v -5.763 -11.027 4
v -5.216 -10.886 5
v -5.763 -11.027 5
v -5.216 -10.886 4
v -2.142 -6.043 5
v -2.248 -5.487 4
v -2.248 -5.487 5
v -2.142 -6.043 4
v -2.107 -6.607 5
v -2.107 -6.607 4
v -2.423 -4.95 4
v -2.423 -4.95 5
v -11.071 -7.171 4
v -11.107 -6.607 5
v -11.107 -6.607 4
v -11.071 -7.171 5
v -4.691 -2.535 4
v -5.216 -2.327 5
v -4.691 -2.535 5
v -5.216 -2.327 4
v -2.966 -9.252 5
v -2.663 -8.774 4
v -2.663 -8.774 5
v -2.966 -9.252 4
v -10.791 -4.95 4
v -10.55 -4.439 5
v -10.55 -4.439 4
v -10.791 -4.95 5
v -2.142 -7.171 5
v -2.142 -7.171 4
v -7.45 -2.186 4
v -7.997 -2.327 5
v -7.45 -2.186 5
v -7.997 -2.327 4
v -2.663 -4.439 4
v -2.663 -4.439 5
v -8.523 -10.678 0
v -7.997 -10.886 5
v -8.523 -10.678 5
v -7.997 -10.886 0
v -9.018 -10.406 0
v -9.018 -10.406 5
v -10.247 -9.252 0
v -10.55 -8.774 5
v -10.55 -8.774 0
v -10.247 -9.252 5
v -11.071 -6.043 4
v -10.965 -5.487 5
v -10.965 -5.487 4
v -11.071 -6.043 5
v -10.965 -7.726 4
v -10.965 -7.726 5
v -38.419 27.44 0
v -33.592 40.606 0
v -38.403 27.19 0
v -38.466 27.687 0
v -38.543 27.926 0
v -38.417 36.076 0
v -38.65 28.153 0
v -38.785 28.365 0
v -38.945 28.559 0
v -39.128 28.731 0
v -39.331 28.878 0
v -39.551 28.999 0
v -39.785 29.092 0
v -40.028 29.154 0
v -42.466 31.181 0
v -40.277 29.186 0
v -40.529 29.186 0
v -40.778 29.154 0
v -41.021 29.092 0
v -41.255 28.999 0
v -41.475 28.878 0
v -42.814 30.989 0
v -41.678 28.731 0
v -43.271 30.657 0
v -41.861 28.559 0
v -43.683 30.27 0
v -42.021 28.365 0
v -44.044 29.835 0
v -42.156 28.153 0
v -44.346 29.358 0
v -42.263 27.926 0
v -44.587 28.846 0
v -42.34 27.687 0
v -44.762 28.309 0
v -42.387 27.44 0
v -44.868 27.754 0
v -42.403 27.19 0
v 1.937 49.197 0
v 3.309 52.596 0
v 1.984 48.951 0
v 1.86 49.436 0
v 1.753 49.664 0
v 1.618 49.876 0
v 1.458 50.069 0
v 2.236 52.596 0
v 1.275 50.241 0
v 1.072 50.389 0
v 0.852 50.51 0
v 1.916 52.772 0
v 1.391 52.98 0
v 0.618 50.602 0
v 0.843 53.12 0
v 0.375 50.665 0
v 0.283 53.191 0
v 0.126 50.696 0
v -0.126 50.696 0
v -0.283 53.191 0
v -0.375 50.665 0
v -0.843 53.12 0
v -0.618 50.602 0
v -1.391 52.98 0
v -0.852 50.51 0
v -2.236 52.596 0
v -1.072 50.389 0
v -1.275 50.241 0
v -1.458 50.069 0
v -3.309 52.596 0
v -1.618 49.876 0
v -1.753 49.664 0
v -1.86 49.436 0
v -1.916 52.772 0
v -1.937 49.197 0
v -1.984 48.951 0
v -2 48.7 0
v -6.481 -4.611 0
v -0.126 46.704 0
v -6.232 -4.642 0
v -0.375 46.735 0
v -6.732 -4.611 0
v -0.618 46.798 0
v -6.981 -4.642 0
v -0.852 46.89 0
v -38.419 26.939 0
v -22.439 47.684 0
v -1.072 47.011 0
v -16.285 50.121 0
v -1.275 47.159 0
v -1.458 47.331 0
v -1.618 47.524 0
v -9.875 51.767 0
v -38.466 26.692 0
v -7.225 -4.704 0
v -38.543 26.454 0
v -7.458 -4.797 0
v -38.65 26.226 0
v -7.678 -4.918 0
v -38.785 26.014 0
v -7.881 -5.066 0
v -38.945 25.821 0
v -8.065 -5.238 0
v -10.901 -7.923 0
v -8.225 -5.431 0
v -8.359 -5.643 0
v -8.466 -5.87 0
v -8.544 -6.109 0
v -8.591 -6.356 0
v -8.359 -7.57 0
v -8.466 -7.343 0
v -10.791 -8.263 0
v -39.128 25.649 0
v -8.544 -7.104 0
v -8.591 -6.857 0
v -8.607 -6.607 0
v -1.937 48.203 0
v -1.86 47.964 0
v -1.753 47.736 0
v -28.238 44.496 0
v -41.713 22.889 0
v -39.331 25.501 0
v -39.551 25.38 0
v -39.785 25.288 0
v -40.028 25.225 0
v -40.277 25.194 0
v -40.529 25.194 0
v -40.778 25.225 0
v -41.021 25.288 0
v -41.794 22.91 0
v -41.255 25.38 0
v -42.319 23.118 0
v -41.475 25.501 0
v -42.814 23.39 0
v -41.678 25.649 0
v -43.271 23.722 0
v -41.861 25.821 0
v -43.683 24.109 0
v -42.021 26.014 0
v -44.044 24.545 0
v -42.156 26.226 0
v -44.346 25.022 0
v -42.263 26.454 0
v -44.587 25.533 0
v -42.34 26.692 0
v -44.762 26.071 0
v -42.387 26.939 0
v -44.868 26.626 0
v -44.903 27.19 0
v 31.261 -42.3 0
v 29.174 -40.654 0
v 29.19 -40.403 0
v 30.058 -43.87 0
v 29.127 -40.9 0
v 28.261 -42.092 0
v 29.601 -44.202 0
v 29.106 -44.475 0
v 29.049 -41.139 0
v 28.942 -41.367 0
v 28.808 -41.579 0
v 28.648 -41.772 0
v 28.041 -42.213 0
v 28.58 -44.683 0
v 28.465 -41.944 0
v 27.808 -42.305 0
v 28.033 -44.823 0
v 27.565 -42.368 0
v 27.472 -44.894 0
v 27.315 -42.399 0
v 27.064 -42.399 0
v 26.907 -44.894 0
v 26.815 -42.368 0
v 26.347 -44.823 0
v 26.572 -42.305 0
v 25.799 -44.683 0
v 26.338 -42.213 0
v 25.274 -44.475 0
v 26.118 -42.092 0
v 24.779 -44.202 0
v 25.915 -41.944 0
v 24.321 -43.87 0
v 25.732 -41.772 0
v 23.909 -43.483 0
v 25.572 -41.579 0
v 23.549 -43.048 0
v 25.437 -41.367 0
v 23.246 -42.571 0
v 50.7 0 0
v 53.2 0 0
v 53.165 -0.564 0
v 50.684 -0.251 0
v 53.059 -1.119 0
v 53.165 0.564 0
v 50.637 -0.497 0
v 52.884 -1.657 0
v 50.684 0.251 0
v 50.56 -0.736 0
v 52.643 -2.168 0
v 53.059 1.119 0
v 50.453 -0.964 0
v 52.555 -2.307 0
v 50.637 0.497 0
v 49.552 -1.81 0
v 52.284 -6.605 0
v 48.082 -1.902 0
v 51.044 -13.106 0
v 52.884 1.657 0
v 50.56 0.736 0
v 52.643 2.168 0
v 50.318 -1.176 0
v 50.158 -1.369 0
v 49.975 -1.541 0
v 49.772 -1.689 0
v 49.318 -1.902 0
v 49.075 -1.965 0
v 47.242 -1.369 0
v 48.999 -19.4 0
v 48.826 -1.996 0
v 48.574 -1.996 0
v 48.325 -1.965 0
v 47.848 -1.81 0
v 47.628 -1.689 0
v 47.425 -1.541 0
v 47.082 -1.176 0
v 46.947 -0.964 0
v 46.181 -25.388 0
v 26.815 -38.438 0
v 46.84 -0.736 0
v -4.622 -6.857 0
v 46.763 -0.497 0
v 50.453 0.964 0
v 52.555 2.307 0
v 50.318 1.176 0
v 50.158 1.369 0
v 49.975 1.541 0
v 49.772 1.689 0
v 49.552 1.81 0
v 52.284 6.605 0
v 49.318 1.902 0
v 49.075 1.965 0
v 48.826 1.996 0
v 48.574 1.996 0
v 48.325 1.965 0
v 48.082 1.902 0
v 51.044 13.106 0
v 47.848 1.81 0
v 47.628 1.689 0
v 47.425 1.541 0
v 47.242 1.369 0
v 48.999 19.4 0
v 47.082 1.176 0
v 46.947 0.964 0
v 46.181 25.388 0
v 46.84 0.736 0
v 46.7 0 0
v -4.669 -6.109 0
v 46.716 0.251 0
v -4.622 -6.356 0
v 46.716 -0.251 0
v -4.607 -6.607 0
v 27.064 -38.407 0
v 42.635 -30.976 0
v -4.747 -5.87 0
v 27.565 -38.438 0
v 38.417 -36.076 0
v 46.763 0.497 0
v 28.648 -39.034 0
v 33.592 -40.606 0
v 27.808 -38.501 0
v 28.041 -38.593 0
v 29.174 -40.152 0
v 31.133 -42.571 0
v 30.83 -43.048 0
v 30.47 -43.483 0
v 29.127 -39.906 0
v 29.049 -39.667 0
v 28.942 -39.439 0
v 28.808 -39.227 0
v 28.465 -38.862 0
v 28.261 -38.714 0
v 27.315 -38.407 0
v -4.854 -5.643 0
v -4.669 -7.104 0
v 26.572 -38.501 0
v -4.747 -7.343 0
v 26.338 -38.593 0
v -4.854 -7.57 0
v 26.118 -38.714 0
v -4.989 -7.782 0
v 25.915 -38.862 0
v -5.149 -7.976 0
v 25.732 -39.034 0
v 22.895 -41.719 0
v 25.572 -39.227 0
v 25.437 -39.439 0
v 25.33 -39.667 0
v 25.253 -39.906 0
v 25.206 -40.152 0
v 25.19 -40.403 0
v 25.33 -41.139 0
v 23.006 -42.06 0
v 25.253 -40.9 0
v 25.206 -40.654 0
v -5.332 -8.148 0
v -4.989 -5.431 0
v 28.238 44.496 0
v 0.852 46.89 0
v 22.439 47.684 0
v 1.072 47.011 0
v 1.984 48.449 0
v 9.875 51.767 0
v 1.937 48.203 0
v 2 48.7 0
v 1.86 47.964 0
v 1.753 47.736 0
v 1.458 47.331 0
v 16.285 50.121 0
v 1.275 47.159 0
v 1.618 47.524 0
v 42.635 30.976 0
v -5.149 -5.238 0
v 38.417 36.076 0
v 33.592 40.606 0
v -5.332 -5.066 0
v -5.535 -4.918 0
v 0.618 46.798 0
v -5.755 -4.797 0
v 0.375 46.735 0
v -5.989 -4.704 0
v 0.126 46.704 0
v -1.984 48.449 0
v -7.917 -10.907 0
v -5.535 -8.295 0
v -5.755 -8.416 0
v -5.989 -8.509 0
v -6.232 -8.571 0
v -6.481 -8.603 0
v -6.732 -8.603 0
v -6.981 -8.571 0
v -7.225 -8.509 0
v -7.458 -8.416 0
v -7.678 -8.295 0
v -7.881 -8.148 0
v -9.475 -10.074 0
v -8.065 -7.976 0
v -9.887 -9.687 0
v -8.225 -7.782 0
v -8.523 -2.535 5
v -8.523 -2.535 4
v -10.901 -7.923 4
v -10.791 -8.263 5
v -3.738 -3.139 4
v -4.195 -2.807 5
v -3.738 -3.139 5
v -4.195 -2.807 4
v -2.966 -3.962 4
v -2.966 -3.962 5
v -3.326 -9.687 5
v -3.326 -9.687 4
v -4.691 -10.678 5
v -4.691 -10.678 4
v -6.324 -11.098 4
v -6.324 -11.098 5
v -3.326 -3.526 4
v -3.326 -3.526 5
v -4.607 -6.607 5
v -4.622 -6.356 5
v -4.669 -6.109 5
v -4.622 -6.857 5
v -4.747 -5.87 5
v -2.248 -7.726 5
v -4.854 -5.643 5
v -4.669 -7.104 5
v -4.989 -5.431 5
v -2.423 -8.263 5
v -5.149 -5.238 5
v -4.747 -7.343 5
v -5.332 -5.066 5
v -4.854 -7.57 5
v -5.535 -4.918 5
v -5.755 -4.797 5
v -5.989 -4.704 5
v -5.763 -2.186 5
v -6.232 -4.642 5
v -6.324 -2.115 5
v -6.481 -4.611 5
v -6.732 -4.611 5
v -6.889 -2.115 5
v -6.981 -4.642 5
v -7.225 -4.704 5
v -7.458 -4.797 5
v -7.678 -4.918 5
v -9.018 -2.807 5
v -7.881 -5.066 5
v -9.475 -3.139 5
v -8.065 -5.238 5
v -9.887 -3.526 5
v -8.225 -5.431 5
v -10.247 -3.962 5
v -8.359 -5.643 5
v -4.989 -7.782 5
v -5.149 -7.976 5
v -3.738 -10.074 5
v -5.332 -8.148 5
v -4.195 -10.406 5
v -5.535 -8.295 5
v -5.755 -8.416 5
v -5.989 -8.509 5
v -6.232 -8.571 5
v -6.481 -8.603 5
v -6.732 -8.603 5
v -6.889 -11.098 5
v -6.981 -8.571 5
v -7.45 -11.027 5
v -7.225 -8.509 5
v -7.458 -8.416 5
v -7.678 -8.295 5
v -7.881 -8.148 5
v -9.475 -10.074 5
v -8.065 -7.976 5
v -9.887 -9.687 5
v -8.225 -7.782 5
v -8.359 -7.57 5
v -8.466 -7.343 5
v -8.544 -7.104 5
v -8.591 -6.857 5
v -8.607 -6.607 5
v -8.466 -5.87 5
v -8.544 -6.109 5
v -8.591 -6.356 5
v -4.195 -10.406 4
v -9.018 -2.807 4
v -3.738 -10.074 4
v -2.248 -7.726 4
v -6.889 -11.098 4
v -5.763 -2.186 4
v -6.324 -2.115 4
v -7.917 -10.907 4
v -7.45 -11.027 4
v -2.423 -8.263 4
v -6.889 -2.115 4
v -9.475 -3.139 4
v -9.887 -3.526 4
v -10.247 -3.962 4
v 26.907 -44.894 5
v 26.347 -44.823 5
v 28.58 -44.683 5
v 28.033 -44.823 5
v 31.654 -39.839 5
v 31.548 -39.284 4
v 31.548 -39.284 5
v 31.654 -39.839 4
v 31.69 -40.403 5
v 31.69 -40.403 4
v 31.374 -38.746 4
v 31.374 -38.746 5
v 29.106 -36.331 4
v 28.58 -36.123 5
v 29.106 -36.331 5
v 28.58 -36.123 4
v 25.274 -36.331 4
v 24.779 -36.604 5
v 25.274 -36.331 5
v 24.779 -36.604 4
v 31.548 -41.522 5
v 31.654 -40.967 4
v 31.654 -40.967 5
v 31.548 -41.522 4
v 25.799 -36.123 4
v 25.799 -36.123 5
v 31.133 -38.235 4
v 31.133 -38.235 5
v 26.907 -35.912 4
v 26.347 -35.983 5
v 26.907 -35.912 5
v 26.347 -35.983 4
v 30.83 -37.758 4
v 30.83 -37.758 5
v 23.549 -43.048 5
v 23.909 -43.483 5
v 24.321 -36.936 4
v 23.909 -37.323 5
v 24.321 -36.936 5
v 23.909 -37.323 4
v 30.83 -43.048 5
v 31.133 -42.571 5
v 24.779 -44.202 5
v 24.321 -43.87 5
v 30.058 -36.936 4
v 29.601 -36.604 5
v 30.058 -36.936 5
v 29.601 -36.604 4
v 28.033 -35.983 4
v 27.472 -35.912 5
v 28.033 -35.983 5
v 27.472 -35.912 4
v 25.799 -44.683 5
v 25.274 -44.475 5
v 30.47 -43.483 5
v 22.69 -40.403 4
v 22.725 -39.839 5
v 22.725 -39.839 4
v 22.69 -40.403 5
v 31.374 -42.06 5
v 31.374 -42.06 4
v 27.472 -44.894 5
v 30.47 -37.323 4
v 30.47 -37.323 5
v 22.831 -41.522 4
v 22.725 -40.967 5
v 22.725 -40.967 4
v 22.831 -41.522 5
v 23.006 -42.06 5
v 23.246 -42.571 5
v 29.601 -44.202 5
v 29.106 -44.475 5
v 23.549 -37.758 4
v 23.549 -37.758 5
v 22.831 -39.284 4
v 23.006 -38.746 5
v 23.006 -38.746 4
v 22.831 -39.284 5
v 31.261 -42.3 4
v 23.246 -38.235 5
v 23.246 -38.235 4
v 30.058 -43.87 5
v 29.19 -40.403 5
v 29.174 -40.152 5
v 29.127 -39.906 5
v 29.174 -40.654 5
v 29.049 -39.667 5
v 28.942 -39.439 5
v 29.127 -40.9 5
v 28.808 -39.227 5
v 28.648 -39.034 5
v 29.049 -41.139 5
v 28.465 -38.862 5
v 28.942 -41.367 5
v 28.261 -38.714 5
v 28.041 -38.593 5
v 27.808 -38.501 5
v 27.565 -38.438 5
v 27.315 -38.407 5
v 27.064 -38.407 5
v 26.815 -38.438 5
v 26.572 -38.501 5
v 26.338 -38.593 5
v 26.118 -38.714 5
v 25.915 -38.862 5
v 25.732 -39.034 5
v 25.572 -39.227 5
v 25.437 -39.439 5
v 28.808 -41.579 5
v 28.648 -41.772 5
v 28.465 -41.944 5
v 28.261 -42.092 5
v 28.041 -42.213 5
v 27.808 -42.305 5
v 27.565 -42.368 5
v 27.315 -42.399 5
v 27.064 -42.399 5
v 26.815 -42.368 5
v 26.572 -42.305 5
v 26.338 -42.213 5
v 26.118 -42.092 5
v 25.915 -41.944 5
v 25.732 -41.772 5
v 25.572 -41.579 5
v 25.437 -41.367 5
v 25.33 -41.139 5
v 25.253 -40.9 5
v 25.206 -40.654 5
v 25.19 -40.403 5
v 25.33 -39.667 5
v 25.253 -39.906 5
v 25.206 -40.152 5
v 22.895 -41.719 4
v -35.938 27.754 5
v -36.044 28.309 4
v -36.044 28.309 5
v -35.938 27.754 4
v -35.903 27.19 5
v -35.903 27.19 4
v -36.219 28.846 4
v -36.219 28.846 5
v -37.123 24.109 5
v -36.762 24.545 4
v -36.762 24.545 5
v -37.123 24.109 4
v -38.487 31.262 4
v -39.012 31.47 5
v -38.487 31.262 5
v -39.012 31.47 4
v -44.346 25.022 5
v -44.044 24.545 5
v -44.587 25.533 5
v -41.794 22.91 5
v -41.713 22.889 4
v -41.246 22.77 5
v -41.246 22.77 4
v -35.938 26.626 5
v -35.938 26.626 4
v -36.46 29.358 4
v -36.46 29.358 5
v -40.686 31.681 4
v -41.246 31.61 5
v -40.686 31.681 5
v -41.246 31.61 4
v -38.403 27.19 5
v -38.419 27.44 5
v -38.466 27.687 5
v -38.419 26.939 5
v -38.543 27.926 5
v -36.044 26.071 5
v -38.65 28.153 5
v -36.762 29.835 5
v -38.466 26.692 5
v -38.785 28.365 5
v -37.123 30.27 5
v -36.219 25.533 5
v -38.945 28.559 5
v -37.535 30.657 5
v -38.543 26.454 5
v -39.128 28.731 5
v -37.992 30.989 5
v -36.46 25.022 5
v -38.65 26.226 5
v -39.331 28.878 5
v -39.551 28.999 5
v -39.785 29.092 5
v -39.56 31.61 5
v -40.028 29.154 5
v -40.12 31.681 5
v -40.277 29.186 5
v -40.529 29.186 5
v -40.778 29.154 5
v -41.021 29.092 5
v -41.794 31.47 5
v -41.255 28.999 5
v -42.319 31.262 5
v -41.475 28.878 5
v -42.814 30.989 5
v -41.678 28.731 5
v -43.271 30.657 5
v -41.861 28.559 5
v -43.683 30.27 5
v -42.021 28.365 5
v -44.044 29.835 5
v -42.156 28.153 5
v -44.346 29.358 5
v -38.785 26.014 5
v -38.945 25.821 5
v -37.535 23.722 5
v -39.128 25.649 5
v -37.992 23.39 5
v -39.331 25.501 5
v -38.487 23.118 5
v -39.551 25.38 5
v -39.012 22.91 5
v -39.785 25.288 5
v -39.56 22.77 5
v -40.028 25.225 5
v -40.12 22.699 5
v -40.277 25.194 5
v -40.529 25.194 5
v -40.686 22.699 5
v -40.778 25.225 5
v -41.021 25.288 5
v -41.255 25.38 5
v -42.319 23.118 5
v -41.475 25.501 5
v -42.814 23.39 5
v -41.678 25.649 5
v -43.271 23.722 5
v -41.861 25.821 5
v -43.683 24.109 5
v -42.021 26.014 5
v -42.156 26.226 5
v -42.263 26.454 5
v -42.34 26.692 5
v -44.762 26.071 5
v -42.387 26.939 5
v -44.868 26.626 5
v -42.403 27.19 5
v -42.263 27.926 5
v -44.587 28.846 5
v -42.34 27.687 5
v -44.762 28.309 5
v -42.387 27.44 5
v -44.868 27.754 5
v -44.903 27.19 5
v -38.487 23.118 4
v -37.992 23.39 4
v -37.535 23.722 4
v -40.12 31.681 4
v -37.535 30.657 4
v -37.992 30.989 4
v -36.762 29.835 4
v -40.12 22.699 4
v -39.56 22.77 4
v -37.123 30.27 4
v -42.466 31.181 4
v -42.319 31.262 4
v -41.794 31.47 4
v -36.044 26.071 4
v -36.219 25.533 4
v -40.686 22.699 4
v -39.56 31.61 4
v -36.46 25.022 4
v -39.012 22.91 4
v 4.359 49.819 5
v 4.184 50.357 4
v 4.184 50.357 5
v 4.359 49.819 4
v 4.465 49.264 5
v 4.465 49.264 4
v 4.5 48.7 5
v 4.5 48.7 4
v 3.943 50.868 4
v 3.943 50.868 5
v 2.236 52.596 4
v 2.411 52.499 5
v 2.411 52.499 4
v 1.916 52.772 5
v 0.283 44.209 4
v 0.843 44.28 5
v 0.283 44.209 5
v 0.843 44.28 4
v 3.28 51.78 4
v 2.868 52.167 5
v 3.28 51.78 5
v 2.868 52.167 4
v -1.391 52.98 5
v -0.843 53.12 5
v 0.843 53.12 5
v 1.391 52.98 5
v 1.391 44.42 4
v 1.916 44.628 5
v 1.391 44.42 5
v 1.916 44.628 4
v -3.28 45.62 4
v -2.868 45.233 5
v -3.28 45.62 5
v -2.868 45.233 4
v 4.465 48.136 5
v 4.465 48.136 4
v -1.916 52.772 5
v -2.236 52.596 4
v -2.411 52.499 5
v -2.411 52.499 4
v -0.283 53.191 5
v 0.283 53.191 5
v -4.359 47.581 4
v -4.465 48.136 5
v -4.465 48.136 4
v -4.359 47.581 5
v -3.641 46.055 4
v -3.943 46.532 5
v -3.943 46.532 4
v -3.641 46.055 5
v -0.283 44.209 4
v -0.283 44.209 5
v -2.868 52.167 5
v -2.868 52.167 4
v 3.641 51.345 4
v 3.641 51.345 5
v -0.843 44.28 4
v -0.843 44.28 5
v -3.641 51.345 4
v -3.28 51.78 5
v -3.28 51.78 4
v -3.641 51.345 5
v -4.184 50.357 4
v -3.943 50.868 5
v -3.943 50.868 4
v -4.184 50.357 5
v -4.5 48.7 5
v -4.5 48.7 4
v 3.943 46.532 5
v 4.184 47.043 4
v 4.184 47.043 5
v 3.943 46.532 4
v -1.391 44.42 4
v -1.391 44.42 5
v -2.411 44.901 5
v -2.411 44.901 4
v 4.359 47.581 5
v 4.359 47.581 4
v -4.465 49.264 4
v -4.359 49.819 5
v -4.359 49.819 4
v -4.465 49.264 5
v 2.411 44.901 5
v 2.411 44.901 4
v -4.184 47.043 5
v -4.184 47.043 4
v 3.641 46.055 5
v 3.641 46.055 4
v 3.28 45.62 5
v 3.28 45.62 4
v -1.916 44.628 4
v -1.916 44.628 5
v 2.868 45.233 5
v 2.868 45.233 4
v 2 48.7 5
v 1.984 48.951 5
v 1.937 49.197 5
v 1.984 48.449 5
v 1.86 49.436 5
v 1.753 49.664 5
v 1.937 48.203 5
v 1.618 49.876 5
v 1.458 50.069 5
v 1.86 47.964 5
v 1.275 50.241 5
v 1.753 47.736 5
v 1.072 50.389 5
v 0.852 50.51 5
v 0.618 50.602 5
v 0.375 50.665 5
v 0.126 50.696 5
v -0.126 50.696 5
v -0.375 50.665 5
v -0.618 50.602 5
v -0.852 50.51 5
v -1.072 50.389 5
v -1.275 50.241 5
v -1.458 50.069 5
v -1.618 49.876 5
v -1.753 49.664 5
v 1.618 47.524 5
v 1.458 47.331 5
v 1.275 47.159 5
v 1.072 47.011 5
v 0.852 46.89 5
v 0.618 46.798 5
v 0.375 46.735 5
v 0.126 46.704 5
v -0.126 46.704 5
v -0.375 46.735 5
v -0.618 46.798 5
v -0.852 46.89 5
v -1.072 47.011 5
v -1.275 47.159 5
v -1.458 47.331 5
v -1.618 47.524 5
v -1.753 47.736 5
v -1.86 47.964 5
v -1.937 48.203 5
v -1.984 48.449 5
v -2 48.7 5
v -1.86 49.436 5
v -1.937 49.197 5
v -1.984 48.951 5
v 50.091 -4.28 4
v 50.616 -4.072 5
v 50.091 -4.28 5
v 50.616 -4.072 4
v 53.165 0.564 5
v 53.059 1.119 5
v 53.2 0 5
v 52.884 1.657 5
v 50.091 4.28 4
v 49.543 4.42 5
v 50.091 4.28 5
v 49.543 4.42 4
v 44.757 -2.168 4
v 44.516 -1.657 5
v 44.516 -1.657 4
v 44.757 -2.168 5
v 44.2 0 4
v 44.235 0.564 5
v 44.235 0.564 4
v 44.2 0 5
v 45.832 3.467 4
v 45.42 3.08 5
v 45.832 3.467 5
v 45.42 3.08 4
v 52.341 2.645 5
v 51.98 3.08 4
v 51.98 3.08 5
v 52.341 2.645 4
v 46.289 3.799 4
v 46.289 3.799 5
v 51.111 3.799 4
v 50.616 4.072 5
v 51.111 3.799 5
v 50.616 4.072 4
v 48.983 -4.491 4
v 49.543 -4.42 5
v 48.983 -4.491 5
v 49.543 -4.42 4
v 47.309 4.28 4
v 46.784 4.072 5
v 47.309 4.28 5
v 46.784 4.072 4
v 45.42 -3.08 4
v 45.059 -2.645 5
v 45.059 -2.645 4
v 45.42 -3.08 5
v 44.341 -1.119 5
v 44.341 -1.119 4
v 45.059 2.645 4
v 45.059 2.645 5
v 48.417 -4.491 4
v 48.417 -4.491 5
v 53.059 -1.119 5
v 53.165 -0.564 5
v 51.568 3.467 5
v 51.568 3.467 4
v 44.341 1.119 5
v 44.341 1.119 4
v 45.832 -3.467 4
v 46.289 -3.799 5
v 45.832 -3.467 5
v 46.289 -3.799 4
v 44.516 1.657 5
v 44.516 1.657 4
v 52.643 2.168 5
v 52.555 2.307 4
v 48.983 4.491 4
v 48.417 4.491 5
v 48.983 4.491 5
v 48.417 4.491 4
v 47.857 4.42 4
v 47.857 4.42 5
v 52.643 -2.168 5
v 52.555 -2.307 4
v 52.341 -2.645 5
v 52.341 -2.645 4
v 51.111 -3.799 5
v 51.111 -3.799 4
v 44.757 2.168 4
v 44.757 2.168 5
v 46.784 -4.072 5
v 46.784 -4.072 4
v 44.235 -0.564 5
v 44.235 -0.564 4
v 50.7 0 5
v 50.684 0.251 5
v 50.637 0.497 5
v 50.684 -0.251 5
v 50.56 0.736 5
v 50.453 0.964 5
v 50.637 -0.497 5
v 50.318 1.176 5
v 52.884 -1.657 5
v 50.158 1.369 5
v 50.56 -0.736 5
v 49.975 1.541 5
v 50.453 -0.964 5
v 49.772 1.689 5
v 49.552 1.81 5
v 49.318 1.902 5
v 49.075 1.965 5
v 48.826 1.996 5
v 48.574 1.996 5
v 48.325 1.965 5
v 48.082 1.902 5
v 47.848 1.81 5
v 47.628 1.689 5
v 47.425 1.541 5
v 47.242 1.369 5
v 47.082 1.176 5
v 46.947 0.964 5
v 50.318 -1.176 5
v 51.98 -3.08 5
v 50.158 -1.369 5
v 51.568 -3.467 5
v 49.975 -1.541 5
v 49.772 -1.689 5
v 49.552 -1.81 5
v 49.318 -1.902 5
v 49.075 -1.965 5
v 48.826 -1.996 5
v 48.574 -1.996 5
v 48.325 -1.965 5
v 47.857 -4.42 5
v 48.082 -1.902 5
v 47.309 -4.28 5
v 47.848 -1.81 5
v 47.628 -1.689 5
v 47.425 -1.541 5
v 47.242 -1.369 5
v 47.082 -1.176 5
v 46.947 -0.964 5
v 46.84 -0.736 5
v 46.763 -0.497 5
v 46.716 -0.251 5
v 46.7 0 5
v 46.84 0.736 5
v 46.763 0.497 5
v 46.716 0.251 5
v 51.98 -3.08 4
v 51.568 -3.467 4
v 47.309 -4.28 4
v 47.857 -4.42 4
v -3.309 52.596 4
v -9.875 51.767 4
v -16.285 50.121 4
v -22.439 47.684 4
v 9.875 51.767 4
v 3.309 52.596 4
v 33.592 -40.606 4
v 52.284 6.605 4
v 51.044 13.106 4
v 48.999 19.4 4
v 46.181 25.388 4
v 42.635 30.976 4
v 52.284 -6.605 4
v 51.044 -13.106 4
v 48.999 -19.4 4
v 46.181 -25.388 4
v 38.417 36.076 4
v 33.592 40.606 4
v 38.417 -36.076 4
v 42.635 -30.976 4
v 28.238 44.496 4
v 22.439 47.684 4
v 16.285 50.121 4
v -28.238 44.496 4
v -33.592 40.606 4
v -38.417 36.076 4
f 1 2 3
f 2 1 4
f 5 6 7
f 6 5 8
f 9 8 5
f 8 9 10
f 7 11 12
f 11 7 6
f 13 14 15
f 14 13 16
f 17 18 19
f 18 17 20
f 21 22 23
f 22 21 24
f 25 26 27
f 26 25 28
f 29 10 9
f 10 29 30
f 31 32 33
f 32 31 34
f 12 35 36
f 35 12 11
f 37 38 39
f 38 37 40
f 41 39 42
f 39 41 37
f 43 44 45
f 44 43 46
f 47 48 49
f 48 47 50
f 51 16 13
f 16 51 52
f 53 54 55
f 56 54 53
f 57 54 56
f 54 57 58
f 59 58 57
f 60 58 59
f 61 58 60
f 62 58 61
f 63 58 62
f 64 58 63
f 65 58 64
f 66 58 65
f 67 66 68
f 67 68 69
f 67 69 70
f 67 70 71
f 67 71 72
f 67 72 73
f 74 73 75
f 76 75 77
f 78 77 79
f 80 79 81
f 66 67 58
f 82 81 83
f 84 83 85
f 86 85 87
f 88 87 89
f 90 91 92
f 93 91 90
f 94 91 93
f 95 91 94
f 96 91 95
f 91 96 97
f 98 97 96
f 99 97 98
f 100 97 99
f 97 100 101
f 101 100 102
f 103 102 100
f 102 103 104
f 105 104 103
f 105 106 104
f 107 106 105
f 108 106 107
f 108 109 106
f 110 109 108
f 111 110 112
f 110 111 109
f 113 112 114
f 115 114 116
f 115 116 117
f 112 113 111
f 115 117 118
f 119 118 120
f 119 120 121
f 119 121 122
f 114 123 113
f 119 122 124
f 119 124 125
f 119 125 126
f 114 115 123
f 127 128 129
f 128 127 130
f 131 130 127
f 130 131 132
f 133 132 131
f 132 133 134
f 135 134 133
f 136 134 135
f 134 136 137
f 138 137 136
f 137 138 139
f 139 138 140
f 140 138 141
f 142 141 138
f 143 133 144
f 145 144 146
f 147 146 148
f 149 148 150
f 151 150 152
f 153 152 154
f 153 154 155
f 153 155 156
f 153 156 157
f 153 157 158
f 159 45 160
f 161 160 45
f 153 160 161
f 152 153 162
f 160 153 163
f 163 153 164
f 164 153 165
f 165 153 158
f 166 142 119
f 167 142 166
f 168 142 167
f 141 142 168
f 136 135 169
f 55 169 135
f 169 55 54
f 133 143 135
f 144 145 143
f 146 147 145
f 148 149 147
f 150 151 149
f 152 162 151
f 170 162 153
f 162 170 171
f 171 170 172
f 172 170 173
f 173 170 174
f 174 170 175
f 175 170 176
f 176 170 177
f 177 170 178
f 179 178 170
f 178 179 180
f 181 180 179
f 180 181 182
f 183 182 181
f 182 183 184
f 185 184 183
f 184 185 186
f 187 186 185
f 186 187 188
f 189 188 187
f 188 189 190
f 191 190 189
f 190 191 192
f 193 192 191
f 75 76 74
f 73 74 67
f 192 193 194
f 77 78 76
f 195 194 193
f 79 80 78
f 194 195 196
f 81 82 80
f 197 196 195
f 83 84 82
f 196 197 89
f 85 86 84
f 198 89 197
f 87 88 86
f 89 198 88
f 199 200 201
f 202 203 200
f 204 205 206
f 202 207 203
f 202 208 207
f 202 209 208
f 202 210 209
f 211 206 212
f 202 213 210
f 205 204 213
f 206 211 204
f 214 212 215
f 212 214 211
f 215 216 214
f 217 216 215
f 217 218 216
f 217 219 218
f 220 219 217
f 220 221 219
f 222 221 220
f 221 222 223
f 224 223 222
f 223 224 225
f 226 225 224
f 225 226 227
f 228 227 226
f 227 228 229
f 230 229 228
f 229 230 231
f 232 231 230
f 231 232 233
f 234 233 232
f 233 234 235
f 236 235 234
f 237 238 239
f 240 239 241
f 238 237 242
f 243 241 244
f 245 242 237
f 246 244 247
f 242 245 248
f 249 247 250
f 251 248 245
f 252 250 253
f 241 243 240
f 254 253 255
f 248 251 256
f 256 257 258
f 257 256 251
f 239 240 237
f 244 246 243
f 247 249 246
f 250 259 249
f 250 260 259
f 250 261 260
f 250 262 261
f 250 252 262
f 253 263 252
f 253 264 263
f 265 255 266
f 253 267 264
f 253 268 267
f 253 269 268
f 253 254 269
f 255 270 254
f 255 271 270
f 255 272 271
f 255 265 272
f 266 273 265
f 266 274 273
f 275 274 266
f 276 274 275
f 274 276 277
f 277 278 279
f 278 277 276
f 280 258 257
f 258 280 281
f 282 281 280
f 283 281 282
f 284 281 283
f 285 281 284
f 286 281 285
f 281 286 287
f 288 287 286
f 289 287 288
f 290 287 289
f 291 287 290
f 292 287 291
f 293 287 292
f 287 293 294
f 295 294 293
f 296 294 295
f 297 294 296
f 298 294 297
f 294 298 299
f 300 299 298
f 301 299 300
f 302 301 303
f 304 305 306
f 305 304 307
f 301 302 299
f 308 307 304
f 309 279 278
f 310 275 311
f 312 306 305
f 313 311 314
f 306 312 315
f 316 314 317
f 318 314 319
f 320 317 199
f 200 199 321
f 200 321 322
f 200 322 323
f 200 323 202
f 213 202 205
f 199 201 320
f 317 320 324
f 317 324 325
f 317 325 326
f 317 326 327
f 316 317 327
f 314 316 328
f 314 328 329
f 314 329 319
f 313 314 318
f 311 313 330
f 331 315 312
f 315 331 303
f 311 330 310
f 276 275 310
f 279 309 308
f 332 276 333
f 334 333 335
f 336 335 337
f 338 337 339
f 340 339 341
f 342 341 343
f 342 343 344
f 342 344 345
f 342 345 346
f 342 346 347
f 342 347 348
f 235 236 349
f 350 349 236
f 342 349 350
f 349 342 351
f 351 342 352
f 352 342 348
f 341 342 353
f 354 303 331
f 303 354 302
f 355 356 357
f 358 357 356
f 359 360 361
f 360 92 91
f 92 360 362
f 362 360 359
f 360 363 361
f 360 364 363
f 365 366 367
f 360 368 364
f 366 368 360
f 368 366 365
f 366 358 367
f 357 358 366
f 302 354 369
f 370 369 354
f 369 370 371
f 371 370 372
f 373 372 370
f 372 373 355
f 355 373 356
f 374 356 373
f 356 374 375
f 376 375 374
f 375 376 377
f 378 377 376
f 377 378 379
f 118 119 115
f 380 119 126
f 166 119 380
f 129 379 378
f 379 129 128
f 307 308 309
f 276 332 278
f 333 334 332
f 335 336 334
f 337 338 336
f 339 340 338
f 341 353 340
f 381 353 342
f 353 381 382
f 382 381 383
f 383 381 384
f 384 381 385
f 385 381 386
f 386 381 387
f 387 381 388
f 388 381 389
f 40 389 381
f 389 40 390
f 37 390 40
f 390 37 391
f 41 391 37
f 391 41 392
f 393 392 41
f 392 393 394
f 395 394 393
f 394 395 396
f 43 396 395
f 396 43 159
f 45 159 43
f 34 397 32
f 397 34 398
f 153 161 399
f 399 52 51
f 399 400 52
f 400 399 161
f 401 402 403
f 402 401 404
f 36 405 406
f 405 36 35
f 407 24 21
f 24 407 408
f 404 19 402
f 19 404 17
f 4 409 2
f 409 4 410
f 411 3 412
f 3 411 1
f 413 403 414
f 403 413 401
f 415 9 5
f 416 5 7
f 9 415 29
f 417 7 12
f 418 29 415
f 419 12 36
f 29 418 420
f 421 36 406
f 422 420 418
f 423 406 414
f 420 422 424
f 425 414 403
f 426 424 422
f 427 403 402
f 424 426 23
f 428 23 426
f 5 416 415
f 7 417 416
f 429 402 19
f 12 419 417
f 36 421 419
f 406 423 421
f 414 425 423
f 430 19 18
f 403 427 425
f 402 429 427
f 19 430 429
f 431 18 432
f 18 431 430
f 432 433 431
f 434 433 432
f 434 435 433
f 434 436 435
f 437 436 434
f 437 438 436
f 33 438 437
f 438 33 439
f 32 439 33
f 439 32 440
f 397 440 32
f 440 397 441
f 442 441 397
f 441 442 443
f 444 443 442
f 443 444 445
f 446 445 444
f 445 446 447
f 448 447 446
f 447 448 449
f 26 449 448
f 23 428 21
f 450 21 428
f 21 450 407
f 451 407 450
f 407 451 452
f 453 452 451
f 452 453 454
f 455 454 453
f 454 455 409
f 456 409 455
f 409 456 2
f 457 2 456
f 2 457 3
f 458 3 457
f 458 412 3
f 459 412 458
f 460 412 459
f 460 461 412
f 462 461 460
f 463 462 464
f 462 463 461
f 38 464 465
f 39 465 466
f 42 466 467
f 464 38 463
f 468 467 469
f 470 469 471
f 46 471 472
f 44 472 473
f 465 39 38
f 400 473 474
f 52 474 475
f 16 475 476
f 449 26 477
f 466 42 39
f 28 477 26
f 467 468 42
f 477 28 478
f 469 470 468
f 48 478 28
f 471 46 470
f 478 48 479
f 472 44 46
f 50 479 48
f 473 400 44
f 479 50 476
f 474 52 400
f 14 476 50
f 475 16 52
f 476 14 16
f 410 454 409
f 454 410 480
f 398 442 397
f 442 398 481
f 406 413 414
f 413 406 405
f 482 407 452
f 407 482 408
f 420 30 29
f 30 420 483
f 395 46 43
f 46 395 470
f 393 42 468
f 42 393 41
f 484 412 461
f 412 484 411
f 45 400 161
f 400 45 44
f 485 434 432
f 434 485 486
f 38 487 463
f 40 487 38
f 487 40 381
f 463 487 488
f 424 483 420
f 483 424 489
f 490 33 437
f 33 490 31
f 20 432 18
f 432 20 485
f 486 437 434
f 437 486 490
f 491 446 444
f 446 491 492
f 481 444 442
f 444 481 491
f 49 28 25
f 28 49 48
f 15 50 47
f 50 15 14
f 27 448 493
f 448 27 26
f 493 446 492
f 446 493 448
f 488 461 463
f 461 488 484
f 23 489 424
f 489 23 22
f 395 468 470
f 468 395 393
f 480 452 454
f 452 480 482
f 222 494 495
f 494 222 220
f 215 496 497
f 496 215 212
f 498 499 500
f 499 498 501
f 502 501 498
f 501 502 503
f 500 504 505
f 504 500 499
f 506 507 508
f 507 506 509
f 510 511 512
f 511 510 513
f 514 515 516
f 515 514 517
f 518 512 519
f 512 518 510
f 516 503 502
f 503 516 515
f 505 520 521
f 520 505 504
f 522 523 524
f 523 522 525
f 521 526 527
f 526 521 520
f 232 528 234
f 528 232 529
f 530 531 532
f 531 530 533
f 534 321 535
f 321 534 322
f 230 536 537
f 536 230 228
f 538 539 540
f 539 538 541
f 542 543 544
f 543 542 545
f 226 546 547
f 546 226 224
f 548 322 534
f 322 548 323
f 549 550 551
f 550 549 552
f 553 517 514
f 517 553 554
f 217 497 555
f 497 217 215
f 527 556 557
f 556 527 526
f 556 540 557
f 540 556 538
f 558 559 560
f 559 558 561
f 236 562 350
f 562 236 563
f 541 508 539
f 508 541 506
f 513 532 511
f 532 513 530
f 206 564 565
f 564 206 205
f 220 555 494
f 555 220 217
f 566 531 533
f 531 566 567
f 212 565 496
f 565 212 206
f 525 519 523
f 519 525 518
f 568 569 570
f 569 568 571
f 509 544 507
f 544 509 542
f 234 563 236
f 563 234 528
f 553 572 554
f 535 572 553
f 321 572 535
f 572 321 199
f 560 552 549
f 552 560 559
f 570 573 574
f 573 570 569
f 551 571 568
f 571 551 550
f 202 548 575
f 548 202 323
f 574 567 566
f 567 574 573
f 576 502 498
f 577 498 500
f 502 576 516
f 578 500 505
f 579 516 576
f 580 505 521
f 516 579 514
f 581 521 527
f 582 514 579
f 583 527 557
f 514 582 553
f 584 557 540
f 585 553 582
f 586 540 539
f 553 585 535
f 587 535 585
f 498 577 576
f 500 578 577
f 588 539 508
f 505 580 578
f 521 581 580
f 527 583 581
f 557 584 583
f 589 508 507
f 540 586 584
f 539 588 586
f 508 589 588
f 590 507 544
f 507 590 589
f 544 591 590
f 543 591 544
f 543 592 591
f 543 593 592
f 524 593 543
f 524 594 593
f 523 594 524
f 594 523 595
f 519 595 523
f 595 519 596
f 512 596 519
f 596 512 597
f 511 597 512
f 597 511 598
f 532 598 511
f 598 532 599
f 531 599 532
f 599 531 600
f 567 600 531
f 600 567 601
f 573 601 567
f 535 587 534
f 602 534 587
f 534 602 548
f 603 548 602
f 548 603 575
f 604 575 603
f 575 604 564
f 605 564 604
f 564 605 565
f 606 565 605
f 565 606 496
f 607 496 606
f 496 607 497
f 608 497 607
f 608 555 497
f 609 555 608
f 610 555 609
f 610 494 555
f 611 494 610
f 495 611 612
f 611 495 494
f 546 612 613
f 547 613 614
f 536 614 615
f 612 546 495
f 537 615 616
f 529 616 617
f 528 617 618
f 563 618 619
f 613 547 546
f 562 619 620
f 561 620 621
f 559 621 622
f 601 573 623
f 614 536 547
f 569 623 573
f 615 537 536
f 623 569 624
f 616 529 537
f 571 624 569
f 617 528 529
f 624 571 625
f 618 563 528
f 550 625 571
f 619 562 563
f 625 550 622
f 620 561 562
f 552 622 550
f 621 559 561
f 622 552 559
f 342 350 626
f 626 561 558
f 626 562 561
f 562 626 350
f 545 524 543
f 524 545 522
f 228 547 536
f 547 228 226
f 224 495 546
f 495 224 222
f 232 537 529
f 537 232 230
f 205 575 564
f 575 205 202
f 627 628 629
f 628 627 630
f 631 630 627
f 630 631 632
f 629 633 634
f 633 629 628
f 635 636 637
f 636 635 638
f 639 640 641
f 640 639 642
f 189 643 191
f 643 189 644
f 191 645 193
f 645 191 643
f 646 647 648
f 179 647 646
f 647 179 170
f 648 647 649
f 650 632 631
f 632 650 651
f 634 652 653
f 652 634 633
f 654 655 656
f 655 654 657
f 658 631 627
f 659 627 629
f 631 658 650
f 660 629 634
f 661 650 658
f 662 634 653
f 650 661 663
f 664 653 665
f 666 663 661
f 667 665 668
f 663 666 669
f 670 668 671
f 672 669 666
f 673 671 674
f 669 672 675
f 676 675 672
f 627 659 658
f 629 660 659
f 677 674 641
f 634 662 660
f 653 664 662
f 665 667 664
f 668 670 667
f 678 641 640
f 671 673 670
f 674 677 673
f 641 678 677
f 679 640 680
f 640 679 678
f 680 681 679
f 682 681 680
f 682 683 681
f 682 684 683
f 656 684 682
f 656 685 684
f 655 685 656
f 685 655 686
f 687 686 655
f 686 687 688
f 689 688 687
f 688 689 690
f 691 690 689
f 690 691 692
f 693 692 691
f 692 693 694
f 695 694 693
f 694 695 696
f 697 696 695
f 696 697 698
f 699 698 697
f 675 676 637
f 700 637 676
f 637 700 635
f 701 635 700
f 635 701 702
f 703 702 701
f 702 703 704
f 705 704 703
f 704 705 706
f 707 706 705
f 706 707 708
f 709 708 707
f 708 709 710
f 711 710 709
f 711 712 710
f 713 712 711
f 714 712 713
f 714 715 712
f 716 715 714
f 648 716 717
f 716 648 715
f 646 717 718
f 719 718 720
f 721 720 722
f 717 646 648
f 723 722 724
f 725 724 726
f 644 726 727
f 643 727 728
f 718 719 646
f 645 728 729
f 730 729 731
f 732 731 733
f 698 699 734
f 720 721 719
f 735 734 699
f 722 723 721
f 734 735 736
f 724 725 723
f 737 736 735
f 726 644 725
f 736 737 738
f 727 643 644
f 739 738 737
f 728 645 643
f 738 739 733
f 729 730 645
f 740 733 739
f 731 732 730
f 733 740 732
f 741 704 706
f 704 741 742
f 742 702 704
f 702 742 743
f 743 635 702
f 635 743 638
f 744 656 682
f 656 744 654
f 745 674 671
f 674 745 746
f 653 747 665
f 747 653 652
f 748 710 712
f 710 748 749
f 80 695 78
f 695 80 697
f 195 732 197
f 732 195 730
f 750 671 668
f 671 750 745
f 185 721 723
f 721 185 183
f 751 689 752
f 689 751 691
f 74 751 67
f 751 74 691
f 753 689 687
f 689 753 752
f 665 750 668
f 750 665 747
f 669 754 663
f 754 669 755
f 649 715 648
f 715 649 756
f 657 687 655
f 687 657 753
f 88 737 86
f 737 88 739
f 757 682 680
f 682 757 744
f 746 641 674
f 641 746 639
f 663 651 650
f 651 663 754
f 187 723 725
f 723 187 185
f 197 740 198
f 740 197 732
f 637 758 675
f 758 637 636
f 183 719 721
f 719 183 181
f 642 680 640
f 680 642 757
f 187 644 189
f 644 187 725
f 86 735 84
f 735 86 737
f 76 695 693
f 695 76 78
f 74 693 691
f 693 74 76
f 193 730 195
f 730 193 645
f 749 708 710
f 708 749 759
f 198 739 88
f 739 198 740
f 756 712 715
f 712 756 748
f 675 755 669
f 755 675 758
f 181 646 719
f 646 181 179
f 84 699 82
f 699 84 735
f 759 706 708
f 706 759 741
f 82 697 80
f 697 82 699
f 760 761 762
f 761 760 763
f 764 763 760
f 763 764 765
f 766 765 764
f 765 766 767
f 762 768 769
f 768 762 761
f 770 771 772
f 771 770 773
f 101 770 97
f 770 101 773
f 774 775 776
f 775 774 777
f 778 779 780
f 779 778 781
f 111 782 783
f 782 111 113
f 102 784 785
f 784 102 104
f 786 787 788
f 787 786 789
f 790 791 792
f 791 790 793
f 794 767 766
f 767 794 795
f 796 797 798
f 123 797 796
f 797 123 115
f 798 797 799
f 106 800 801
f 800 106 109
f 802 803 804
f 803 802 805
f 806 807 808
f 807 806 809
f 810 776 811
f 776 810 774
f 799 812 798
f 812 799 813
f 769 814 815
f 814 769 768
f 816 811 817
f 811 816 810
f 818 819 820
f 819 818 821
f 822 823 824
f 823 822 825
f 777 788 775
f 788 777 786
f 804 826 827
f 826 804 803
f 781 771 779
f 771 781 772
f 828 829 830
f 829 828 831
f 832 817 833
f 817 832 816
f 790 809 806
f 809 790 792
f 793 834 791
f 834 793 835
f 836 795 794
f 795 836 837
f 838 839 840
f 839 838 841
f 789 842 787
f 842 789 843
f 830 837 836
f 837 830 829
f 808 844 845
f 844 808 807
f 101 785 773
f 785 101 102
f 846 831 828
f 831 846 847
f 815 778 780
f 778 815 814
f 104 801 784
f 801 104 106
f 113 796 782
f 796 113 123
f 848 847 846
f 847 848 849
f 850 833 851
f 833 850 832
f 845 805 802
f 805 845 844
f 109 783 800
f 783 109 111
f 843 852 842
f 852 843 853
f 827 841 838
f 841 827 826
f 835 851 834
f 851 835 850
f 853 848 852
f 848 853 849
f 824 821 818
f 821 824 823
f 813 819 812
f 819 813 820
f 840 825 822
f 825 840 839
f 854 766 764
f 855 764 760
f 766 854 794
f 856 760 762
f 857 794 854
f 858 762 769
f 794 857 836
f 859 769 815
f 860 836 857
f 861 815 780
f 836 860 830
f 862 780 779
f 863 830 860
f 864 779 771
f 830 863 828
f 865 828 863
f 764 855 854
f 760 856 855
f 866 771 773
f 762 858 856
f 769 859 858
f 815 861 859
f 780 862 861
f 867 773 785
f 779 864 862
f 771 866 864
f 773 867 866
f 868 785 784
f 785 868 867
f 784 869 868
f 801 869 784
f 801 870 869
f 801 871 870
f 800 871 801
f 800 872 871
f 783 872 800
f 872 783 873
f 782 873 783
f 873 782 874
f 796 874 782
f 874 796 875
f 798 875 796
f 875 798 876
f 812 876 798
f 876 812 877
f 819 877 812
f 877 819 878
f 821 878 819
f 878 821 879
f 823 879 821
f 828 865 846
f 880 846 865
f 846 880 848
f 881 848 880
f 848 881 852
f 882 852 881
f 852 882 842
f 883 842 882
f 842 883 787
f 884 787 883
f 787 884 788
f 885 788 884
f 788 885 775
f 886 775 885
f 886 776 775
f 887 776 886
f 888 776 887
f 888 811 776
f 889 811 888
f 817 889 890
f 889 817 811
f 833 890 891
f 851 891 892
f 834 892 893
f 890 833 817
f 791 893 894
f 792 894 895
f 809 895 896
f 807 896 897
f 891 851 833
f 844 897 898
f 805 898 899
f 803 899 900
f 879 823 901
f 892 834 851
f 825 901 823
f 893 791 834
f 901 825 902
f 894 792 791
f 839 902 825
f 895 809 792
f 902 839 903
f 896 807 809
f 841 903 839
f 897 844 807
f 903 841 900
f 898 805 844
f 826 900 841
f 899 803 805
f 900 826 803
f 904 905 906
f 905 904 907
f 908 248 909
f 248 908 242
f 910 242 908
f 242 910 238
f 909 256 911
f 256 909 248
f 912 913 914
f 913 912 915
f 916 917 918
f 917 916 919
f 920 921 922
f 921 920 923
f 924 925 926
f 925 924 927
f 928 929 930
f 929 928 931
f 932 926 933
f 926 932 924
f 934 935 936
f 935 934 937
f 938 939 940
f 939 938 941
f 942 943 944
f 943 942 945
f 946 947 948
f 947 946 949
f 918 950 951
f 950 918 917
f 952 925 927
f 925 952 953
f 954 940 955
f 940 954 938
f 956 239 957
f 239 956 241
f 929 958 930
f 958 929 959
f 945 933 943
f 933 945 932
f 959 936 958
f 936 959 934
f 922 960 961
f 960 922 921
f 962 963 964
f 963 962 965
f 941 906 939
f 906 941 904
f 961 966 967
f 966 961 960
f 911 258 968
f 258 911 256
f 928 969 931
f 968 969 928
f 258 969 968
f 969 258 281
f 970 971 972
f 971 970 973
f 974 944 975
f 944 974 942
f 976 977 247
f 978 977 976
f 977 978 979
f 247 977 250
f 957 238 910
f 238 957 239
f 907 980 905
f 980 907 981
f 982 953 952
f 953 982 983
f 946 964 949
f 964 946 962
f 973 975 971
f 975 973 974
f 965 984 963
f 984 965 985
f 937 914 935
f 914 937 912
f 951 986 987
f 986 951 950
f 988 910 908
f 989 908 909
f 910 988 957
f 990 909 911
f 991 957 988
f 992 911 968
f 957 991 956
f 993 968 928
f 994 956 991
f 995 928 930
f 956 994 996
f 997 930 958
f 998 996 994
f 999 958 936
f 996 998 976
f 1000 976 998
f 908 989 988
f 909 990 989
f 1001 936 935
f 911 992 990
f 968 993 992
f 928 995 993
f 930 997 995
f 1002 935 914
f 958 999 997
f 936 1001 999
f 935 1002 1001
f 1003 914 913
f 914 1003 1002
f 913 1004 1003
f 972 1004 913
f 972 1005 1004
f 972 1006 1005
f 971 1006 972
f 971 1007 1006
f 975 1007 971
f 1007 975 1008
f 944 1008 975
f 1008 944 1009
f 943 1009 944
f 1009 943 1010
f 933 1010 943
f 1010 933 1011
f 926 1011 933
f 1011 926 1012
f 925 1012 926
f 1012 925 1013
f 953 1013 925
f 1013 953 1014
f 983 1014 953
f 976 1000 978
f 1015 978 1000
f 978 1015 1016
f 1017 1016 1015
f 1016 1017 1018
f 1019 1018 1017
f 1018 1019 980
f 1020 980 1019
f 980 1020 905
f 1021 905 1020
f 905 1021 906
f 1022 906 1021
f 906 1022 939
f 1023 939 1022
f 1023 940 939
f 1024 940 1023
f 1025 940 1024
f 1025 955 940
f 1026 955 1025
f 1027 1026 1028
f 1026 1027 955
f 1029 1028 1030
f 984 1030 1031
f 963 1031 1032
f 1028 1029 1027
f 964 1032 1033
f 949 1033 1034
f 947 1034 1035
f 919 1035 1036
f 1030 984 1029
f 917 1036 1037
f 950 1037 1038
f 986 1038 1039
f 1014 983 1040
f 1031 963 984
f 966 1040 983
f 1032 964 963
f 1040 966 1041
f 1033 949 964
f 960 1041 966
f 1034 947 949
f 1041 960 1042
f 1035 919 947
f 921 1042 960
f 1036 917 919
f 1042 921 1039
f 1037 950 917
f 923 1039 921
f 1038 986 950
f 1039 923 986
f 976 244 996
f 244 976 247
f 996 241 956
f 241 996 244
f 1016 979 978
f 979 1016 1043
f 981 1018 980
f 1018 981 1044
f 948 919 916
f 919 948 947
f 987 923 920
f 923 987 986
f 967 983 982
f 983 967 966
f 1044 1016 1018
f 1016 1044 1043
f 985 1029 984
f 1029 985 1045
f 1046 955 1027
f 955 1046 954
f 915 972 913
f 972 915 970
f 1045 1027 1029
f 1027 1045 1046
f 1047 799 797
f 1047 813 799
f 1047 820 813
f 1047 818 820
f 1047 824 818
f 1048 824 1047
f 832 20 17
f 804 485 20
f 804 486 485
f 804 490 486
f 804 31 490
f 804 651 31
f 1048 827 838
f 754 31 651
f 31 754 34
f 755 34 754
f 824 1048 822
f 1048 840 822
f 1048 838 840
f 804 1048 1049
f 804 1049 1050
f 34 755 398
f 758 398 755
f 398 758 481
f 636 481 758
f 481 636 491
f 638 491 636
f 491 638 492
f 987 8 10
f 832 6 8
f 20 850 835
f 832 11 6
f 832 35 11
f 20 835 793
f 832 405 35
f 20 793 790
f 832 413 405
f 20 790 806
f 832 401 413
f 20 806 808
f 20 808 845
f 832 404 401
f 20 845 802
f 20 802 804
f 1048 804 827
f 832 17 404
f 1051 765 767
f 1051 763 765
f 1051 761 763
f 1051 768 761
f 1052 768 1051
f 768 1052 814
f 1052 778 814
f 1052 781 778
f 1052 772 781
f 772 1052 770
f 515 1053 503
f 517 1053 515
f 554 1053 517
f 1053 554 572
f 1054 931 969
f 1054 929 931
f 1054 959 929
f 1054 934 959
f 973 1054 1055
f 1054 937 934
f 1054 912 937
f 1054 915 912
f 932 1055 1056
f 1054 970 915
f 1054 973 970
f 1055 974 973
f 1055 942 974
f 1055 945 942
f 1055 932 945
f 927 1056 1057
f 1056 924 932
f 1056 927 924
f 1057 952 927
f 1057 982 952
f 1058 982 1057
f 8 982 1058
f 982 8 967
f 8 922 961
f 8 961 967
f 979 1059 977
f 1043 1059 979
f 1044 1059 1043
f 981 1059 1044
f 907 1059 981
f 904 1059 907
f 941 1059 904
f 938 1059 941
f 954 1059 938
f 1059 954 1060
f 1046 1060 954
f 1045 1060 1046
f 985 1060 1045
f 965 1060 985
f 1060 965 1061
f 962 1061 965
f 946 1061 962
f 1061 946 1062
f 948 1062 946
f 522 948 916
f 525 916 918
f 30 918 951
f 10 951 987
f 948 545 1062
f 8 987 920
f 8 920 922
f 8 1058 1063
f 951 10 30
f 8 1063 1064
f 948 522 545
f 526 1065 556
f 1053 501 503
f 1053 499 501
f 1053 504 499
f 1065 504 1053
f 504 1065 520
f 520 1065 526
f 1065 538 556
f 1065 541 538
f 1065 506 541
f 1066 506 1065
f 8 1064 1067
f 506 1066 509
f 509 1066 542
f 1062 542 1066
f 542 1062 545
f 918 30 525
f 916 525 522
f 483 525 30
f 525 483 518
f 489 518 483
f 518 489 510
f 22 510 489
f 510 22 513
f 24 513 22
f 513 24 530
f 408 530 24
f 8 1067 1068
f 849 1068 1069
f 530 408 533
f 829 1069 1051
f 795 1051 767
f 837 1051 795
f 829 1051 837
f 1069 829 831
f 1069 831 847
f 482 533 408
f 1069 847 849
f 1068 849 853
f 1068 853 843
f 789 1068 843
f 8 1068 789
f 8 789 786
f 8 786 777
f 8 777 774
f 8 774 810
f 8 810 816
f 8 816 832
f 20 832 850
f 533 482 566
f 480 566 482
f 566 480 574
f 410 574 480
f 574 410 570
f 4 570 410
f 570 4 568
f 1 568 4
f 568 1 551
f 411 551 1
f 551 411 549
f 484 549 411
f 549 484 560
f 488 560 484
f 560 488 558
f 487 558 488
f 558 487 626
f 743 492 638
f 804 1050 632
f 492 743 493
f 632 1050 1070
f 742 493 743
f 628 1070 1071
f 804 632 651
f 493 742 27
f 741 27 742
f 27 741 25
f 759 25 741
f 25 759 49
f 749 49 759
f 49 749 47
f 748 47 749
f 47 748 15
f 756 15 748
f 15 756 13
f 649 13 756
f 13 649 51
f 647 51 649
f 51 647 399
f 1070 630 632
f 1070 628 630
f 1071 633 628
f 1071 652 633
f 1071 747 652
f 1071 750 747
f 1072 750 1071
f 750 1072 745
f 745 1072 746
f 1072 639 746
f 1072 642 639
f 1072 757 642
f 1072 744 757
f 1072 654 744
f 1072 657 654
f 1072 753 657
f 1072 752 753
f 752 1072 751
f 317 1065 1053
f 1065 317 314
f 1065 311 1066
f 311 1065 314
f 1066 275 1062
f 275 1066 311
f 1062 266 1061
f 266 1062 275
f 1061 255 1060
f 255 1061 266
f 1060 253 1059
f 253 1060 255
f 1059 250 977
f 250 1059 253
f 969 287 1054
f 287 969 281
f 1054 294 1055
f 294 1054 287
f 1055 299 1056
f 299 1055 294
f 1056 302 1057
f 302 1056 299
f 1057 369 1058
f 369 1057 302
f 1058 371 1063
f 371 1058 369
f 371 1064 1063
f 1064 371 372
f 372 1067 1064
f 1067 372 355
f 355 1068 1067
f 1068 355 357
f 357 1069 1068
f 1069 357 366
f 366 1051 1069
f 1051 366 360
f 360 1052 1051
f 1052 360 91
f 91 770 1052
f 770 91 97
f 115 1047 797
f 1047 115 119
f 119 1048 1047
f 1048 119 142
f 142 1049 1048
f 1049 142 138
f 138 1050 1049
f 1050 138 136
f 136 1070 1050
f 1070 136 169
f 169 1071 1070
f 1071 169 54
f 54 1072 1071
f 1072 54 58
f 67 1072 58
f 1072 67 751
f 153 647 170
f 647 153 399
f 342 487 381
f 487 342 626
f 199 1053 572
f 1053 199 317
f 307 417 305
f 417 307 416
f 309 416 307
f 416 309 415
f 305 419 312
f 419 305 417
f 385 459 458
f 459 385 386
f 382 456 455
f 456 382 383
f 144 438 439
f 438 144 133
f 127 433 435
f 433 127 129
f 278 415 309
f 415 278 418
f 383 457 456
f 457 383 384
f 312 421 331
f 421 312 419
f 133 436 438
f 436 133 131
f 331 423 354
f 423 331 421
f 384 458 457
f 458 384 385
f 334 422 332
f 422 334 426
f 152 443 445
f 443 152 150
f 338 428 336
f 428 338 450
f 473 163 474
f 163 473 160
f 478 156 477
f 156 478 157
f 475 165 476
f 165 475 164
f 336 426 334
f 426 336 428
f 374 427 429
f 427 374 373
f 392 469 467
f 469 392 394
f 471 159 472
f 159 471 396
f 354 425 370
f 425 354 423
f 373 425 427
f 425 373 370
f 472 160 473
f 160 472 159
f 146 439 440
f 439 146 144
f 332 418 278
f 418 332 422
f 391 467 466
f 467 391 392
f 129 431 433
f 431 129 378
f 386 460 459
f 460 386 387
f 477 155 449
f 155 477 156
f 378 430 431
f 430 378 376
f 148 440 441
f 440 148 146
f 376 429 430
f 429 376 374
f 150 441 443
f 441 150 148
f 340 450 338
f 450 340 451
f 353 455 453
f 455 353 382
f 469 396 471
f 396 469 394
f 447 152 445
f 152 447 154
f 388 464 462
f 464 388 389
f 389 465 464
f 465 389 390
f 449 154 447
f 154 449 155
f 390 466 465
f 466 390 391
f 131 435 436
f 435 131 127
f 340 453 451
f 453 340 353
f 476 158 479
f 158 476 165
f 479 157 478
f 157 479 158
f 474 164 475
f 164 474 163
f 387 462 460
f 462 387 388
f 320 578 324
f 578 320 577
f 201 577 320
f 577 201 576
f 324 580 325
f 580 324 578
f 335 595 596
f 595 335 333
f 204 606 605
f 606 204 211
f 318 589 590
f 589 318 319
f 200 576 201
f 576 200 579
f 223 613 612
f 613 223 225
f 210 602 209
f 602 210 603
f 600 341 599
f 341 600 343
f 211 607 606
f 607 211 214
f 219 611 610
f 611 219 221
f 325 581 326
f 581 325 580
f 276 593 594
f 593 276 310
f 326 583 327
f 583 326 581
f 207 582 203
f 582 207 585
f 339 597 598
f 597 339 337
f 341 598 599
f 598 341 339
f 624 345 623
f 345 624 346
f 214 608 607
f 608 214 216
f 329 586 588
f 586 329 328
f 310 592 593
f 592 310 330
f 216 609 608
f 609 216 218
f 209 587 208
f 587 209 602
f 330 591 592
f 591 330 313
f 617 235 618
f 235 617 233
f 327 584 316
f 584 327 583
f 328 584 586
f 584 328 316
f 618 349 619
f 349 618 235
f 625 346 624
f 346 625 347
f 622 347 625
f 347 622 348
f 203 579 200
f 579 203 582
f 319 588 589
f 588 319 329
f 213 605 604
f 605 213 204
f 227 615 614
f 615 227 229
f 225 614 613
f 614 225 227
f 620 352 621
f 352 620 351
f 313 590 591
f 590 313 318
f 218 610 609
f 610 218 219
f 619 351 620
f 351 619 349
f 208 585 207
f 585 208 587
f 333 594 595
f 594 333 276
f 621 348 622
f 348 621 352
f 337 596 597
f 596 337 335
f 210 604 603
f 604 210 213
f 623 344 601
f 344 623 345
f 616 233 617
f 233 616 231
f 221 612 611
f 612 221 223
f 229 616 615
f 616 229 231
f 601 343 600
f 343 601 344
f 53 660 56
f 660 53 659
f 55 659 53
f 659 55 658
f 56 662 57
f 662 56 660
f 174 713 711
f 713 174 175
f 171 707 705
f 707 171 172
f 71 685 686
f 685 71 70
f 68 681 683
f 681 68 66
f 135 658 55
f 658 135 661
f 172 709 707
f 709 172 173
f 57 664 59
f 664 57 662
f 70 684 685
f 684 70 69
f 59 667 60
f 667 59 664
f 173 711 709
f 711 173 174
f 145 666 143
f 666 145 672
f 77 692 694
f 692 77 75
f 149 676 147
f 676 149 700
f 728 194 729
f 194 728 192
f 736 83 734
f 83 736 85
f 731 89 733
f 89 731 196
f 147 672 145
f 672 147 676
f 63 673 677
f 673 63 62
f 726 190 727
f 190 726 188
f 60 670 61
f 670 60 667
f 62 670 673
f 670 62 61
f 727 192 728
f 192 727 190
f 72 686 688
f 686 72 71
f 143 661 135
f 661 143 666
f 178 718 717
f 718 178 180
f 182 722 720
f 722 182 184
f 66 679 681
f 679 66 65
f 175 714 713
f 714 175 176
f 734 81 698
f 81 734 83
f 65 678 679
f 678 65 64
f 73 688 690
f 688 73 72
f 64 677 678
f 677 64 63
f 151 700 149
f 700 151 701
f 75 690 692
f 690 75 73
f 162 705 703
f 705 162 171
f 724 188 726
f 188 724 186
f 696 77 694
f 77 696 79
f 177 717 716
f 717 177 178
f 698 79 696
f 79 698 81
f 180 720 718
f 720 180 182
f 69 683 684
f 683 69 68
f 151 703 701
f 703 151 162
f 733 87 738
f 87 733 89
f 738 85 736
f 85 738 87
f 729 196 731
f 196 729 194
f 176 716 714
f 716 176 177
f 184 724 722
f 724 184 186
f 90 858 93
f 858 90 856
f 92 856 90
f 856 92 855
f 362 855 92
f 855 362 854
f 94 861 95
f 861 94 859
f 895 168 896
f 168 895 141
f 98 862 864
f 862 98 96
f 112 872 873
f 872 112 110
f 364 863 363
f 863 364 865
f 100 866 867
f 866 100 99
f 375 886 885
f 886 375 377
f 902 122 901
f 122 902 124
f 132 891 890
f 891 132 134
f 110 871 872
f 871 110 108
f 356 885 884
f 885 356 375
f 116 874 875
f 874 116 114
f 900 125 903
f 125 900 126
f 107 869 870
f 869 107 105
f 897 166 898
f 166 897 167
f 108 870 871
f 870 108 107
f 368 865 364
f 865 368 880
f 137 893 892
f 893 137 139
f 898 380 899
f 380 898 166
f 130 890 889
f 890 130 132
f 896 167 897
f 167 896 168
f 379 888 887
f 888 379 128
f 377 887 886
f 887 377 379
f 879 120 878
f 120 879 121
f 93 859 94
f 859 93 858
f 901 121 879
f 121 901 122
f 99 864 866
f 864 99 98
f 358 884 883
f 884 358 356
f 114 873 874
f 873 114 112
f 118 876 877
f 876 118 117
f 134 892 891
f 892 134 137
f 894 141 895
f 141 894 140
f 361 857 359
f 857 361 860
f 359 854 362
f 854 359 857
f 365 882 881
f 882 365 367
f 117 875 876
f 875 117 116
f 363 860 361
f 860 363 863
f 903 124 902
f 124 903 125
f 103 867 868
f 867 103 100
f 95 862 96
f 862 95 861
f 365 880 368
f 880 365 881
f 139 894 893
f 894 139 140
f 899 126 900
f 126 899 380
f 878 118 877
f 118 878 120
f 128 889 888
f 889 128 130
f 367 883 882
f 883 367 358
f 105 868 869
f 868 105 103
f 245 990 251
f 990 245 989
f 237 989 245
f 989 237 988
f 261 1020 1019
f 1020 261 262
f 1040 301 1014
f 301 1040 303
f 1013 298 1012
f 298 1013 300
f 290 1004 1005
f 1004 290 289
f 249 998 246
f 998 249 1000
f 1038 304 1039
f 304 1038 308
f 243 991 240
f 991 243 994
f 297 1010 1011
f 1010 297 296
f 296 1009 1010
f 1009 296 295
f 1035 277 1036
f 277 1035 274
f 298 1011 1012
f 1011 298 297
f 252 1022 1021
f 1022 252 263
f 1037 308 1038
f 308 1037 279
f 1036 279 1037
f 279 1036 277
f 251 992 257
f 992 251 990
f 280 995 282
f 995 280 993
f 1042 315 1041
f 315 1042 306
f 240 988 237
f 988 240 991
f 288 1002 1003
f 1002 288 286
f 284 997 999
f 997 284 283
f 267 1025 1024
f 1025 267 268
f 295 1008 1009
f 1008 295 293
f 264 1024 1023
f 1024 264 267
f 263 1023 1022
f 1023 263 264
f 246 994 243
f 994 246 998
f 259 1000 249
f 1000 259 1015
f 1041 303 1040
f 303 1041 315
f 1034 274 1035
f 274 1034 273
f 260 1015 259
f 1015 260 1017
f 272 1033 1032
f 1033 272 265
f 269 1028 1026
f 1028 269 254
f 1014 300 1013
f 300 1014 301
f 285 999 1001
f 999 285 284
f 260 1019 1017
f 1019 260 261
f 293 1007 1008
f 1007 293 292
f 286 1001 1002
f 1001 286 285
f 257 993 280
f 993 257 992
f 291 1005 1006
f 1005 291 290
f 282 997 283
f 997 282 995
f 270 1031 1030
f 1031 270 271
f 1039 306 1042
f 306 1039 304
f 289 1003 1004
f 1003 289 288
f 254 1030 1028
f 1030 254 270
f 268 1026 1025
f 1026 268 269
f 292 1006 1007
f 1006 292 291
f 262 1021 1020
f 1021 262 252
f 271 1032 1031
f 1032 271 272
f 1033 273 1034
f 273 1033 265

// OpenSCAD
// file: arc.scad
// function - radius is inside radius
//   BUT - I called radius the OUTSIDE


$fn = 50;

module sector(radius, angles, fn = 24) {
    r = radius / cos(180 / fn);
    step = -360 / fn;

    points = concat([[0, 0]],
        [for(a = [angles[0] : step : angles[1] - 360]) 
            [r * cos(a), r * sin(a)]
        ],
        [[r * cos(angles[1]), r * sin(angles[1])]]
    );

    difference() {
        circle(radius, $fn = fn);
        polygon(points);
    }
}

module arc(radius, angles, width = 1, fn = 24) {
    echo ("INSIDE radius =", radius);
    echo ("OUTSIDE radius =", (radius + width));
    echo ("Angle Range =", angles);
    difference() {
        sector(radius + width, angles, fn);
        sector(radius, angles, fn);
    }
} 

// linear_extrude(50)
// arc(105, [146, -56], 2, 50);
// main file
include <arc.scad>;

// constants taken from echo statements in base_plate.scad
mounting_post_diameter = 9;
mounting_thru_diameter = 4;

mounting_hole_xy_list = [
 [  -6.6066, -6.6066],
 [27.1898, -40.403],
 [ -40.403, 27.1898],
 [    0, 48.7],
 [ 48.7,    0],
];

arc_angles = [146.061, -56.0608];
arc_radius = 105.4/2;

cover_thickness = 4;

// chord box
obtuse_angle = (360 - (arc_angles[0] - arc_angles[1]));
echo ("obtuse angle:", obtuse_angle);
acute_angle = 90 - obtuse_angle/2;
echo ("acute angle:", acute_angle);
adj = cos(acute_angle) * arc_radius;
echo ("adjacent:", adj);
opp = sin(acute_angle) * arc_radius;
square_length = adj * 2;
square_width = opp * 2;
echo ("square width/length:", square_width, square_length);

//

//for (center = (mounting_hole_xy_list))
//    {
//            {
//             // post
//            translate(center)
//            cylinder(h=cover_thickness+1, r=mounting_post_diameter/2);
//            }
//        }
    
difference() {

        {
        // union the 2D + 3D objects
        union () 
            {
            // cover - 2D
            linear_extrude(cover_thickness)  
            union () {
                sector(radius = arc_radius, angles = arc_angles, fn = 50);
                rotate([0,0, -(arc_angles[0] + (90-acute_angle))])
                // fat finger adjustment !! not mathmatical
                square([square_length - 6.6, square_width + 6.4], center=true);
                }
            // post - 3D
            for (center = (mounting_hole_xy_list))           
                {
                translate(center)
                cylinder(h=cover_thickness+1, r=mounting_post_diameter/2);
                }
            } 

        }
        {
        // thru hole
        for (center = (mounting_hole_xy_list))           
            {
            translate (center)
            cylinder(h=cover_thickness+3, r=mounting_thru_diameter/2);
            }
        }
    }        
    
    
    
     
 
